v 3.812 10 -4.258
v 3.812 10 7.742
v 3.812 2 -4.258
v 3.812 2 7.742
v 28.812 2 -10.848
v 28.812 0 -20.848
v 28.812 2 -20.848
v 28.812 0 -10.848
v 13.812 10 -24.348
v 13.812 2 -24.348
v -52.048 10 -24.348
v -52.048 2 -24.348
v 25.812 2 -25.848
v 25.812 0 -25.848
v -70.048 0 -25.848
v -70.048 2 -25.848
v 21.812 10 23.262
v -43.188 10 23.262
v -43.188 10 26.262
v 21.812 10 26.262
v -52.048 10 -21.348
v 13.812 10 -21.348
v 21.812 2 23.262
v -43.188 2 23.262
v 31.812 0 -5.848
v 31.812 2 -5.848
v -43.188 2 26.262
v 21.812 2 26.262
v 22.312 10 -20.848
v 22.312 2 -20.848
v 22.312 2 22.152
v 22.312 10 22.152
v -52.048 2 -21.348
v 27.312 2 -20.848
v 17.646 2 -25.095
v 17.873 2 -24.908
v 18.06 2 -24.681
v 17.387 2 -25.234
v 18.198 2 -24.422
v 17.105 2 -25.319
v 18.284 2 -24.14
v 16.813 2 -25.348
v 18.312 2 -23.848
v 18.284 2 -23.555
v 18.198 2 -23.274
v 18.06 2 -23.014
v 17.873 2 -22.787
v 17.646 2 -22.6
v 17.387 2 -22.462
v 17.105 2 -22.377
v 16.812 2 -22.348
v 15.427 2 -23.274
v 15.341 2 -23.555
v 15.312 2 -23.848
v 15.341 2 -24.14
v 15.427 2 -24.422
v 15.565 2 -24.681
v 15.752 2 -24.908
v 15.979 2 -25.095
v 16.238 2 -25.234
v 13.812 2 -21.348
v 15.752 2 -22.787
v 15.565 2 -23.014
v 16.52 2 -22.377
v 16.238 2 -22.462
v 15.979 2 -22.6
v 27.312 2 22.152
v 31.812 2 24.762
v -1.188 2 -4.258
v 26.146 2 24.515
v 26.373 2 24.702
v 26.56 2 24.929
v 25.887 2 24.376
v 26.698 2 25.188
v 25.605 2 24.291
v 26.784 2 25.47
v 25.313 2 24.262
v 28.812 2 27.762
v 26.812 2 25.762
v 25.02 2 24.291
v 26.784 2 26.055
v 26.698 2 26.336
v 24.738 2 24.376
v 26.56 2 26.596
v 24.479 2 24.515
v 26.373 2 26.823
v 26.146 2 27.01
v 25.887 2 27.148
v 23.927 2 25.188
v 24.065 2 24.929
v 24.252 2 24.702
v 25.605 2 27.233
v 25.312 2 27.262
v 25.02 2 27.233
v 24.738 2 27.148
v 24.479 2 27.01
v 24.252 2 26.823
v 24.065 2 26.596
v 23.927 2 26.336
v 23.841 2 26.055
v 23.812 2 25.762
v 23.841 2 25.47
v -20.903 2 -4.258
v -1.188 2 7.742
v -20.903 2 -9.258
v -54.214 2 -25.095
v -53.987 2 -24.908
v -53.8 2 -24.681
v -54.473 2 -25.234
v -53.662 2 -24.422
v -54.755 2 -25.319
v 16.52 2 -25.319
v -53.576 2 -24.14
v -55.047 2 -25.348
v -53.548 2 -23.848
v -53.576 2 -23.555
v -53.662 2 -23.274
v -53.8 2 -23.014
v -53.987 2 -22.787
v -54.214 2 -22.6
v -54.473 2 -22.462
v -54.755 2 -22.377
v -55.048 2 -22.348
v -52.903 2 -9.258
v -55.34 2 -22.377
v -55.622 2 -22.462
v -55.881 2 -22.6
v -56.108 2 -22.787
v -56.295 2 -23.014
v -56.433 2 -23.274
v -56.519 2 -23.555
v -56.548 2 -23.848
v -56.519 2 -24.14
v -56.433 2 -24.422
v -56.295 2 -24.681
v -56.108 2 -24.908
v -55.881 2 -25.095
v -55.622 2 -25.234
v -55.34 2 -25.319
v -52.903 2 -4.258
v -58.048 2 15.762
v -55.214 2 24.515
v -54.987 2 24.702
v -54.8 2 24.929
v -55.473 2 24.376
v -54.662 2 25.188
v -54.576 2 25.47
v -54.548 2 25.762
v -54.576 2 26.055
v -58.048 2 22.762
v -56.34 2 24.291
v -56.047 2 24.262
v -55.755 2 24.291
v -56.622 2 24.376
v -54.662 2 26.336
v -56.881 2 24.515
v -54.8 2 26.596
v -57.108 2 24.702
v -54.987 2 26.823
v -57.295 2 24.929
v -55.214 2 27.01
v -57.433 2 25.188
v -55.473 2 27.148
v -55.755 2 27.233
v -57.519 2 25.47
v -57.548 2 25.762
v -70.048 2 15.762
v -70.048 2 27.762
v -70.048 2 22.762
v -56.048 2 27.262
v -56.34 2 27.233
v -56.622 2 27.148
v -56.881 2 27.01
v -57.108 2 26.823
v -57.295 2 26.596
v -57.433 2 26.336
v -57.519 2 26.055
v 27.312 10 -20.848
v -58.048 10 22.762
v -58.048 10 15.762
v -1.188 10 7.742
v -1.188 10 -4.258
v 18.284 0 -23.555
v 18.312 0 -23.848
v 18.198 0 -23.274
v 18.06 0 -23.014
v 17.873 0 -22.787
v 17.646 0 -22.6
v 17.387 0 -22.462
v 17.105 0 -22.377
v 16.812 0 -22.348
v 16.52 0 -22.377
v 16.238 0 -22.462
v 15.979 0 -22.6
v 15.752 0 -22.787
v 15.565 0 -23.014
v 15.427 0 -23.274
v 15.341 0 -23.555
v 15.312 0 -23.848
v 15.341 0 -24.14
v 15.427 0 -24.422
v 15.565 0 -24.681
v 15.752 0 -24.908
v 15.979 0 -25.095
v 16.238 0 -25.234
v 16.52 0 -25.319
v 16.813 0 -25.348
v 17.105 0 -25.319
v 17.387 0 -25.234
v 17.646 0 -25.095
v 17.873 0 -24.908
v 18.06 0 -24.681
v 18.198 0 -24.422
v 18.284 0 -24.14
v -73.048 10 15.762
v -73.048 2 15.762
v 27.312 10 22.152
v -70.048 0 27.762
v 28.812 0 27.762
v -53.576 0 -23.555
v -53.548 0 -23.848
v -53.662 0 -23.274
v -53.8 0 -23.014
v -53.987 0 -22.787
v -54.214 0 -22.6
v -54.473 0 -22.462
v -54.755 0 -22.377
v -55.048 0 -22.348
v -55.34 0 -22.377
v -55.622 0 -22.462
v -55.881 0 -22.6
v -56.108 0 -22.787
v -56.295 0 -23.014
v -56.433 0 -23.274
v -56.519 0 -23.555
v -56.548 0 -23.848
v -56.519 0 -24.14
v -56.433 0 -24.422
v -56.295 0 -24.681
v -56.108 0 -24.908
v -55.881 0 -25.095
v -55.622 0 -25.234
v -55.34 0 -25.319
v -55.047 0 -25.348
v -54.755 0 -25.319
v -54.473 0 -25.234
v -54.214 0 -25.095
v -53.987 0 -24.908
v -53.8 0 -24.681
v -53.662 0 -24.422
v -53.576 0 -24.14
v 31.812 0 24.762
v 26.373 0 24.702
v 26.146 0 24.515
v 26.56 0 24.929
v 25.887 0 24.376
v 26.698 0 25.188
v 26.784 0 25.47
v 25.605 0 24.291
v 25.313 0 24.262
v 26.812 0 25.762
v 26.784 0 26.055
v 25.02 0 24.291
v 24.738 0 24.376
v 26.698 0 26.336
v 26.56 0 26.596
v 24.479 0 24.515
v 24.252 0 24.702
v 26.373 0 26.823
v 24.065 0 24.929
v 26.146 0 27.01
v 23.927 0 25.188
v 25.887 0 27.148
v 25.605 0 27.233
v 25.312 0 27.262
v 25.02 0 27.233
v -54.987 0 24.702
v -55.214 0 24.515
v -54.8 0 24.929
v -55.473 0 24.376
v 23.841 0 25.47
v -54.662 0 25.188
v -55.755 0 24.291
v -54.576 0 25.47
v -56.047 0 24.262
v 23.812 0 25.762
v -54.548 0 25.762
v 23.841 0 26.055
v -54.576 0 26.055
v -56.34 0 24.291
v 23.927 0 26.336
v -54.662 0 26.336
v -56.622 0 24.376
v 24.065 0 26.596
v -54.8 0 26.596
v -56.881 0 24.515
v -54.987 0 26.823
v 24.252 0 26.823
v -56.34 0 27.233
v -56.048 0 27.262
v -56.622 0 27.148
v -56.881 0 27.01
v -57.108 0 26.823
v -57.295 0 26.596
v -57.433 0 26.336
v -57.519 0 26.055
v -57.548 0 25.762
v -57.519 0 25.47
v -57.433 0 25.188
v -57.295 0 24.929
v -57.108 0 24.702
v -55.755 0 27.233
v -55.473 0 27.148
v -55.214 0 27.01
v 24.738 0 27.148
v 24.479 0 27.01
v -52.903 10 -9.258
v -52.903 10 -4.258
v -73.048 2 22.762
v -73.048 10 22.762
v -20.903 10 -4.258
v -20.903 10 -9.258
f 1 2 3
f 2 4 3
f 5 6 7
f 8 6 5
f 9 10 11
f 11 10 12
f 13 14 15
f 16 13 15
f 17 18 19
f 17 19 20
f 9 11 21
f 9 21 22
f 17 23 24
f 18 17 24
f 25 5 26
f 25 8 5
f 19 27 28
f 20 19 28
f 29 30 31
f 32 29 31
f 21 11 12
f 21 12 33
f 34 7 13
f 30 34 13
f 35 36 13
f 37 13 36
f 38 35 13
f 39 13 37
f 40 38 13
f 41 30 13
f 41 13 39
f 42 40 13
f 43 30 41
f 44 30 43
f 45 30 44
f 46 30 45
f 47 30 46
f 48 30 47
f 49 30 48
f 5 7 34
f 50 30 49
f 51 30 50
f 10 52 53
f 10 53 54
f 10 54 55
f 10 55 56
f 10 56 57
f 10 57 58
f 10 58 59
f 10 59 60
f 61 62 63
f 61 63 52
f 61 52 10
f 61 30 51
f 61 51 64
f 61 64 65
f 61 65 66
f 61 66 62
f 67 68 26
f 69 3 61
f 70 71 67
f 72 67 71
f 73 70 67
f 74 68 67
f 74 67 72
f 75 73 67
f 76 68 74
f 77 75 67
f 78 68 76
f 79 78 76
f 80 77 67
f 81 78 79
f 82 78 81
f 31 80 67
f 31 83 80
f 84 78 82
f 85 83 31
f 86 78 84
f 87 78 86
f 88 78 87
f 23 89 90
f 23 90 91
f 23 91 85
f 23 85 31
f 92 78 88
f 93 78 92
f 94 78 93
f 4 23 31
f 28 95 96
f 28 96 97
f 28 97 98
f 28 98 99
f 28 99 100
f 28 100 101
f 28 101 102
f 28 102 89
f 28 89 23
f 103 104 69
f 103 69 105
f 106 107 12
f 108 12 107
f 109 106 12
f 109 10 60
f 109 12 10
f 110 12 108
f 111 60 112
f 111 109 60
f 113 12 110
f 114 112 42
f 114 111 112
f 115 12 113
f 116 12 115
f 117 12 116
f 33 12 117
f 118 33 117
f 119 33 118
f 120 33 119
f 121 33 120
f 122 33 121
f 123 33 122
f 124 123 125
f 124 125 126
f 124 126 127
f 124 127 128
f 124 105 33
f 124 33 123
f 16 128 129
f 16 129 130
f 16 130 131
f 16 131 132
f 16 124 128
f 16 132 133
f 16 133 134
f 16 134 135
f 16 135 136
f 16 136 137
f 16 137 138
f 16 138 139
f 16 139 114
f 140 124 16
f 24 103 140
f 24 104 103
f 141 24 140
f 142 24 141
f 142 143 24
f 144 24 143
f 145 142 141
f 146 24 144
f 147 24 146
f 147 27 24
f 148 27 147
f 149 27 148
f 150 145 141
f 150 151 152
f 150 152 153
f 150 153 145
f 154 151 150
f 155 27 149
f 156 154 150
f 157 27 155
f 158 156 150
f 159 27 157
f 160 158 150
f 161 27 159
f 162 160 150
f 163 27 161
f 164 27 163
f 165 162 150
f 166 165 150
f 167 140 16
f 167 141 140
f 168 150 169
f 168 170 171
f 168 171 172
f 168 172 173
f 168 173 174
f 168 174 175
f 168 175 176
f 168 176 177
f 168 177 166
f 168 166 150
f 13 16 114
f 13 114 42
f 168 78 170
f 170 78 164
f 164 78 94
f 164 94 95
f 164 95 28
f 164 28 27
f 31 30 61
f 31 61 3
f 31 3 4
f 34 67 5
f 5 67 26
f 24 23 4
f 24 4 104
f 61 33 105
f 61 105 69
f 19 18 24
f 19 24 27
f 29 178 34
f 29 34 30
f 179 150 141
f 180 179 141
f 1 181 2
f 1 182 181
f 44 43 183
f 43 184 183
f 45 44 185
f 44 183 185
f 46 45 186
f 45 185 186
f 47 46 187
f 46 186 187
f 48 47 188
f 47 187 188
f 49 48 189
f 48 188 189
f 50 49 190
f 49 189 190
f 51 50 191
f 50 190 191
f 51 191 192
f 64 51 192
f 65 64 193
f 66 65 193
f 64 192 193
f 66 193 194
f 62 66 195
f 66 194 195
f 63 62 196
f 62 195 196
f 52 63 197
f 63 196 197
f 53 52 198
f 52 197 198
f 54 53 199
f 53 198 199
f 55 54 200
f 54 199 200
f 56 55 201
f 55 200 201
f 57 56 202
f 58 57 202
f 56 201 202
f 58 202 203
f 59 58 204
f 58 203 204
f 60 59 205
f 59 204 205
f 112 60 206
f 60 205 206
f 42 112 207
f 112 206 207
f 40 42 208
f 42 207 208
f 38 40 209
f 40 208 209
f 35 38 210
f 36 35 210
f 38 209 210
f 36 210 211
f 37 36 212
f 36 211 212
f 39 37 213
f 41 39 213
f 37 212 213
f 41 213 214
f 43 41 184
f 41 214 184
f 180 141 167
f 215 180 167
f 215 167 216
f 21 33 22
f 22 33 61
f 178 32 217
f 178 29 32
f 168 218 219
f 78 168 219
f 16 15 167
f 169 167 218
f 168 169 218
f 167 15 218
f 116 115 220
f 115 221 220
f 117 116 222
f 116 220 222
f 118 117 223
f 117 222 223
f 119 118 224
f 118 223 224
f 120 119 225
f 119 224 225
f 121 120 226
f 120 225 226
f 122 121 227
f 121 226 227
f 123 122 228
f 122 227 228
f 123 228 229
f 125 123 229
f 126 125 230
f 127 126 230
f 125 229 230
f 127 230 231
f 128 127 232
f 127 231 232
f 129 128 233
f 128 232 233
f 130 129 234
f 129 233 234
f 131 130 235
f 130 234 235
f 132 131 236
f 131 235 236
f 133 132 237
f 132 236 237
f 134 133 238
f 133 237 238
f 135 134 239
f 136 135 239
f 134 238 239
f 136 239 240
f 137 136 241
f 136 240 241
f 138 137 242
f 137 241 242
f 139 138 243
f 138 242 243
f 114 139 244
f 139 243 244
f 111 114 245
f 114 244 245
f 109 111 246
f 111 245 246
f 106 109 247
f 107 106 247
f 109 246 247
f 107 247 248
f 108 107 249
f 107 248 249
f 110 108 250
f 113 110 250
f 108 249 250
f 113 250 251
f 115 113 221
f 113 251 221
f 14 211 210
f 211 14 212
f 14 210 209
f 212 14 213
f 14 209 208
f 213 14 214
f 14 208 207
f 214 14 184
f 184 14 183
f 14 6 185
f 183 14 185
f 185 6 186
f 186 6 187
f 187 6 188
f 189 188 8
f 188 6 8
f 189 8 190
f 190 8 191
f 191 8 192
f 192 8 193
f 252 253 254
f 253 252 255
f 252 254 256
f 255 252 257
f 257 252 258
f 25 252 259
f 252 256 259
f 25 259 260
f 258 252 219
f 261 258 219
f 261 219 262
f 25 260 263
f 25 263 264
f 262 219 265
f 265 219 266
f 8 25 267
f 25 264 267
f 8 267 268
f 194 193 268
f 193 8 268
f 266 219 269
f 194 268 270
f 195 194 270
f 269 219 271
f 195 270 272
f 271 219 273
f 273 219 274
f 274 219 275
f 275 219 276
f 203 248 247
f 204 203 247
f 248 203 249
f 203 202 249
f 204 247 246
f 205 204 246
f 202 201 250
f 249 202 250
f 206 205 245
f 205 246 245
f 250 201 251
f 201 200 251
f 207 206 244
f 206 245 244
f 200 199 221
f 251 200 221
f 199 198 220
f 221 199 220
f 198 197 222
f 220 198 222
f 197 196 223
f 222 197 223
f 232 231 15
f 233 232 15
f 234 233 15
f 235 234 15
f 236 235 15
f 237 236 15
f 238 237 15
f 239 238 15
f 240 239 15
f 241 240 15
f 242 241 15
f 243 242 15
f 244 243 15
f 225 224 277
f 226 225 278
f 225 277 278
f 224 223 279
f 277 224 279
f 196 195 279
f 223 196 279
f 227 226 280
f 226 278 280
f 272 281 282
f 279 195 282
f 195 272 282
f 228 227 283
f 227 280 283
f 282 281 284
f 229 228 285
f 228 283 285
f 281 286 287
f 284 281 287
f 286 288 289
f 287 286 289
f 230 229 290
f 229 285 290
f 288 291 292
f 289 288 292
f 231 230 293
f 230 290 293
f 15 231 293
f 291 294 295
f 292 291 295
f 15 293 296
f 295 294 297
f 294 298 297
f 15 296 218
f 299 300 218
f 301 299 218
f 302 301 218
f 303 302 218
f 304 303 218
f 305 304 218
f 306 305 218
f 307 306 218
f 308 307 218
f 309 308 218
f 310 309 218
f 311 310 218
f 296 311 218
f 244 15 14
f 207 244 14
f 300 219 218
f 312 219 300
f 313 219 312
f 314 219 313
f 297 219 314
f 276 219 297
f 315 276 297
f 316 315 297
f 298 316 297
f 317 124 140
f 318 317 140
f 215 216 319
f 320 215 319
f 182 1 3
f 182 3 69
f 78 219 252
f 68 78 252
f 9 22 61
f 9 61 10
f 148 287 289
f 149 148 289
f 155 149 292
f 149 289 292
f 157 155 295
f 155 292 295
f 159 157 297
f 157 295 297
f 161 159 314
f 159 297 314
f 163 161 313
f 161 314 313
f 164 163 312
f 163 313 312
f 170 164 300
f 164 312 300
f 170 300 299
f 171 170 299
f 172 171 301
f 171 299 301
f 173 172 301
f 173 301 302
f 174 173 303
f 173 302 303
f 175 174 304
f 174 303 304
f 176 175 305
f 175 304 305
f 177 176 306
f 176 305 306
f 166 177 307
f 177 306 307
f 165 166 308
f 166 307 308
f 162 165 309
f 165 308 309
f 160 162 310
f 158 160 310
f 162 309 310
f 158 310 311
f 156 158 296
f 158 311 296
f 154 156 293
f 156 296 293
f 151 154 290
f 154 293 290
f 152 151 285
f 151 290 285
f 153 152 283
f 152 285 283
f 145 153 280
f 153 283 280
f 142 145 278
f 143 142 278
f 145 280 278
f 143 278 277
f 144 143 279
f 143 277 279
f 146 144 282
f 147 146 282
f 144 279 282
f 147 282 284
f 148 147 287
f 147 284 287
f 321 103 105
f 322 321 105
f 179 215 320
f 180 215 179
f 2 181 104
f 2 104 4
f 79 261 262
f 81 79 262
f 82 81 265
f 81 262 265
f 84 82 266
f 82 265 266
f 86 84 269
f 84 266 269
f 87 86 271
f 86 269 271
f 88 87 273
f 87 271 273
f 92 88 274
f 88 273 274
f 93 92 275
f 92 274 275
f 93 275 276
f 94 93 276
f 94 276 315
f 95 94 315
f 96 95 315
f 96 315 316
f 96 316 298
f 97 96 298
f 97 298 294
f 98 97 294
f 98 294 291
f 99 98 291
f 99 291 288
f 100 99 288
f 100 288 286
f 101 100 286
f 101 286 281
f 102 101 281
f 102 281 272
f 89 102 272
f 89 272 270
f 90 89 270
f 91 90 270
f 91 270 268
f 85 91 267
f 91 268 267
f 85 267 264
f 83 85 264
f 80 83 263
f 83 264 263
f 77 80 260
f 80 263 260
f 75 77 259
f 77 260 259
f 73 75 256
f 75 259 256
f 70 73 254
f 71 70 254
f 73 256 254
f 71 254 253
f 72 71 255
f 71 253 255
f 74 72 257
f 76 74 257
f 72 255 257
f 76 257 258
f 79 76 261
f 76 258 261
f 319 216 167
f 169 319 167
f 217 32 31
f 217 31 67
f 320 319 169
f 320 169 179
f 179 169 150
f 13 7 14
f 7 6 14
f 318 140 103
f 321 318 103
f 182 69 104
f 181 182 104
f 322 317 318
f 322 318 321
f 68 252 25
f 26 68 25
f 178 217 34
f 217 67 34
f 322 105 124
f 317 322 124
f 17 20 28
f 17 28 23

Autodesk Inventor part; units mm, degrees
ref_plane "YZ Plane" through (0, 0, 0) normal (1, 0, 0) x (0, 1, 0)
ref_plane "XZ Plane" through (0, 0, 0) normal (0, 1, 0) x (-1, 0, 0)
ref_plane "XY Plane" through (0, 0, 0) normal (0, 0, 1) x (1, 0, 0)
sketch "Boceto1" plane through (0, 0, 0) normal (0, 1, 0) x (-1, 0, 0)
  line L0 (70.0475, 27.7623) -> (-31.8125, 27.7623)
  line L1 (-31.8125, 27.7623) -> (-31.8125, -25.8477)
  line L2 (-31.8125, -25.8477) -> (70.0475, -25.8477)
  line L3 (70.0475, -25.8477) -> (70.0475, 27.7623)
  point P0 (0, 0)
  dimension "d0" = 53.61
  dimension "d1" = 101.86
extrude "Extrusión1" add sketch "Boceto1" along normal blind 2
sketch "Boceto6" plane through (0, 0, 0) normal (0, -1, 0) x (1, 0, 0)
  line L0 (-50.0475, 27.7623) -> (23.8125, 27.7623) projected
  line L1 (28.8125, 27.7623) -> (31.8125, 24.7623)
  line L2 (31.8125, 27.7623) -> (31.8125, -25.8477) projected
  line L3 (-70.0475, 27.7623) -> (31.8125, 27.7623) projected
  line L4 (28.8125, 27.7623) -> (31.8125, 27.7623)
  line L5 (31.8125, 27.7623) -> (31.8125, 24.7623)
  circle A0 centre (25.3125, 25.7623) radius 1.5
  line L6 (31.8125, 17.7623) -> (31.8125, -25.8477) projected
  line L7 (31.8125, -15.8477) -> (25.8125, -25.8477)
  line L8 (31.8125, -25.8477) -> (23.8125, -25.8477) projected
  line L9 (31.8125, -25.8477) -> (28.8125, -25.8477)
  line L10 (28.8125, -25.8477) -> (28.8125, 5.0493)
  line L11 (28.8125, -10.8477) -> (31.8125, -5.8477)
  line L12 (31.8125, -5.8477) -> (31.8125, -25.8477)
  line L13 (25.8125, -25.8477) -> (31.8125, -25.8477)
  circle A1 centre (16.8125, -23.8477) radius 1.5
  line L14 (31.8125, -25.8477) -> (-70.0475, -25.8477) projected
  circle A2 centre (-56.0475, 25.7623) radius 1.5
  line L15 (-70.0475, 27.7623) -> (31.8125, 27.7623) projected
  line L16 (-70.0475, -25.8477) -> (-70.0475, 27.7623) projected
  circle A3 centre (-55.0475, -23.8477) radius 1.5
  point P0 (0, 0)
  point P1 (28.8125, -20.8477)
  point P2 (28.8125, -20.8477)
  dimension "d39" = 3
  dimension "d40" = 3
  dimension "d41" = 3
  dimension "d42" = 6.5
  dimension "d43" = 2
  dimension "d44" = 6
  dimension "d45" = 10
  dimension "d46" = 3
  dimension "d47" = 10
  dimension "d48" = 10
  dimension "d49" = 3
  dimension "d50" = 2
  dimension "d51" = 15
  dimension "d52" = 3
  dimension "d53" = 2
  dimension "d54" = 14
  dimension "d55" = 3
  dimension "d56" = 2
  dimension "d57" = 15
extrude "Extrusión7" cut sketch "Boceto6" against normal blind 3 contours L3 L2 L1 | L7 L10 L8 | L2 L7 L10 L11 | L7 L2 L8 L10 | A0 | A1 | A2 | A3
sketch "Boceto5" plane through (0, 2, 0) normal (0, 1, 0) x (1, 0, 0)
  line L0 (-73.0475, -22.7623) -> (-58.0475, -22.7623)
  line L1 (-58.0475, -22.7623) -> (-58.0475, -15.7623)
  line L2 (-58.0475, -15.7623) -> (-73.0475, -15.7623)
  line L3 (-73.0475, -15.7623) -> (-73.0475, -22.7623)
  line L4 (-70.0475, -27.7623) -> (31.8125, -27.7623) projected
  line L5 (-70.0475, 25.8477) -> (-70.0475, -27.7623) projected
  point P0 (0, 0)
  point P1 (-50.0475, -27.7623)
  point P2 (-65.5475, -22.7623)
  dimension "d33" = 5
  dimension "d34" = 7
  dimension "d35" = 3
  dimension "d36" = 15
extrude "Extrusión6" add sketch "Boceto5" along normal blind 8
sketch "Boceto4" plane through (0, 2, 0) normal (0, 1, 0) x (1, 0, 0)
  line L0 (-52.9032, 4.2581) -> (-20.9032, 4.2581)
  line L1 (-20.9032, 4.2581) -> (-20.9032, 9.2581)
  line L2 (-20.9032, 9.2581) -> (-52.9032, 9.2581)
  line L3 (-52.9032, 9.2581) -> (-52.9032, 4.2581)
  line L4 (-1.1875, -7.7419) -> (3.8125, -7.7419)
  line L5 (3.8125, -7.7419) -> (3.8125, 4.2581)
  line L6 (3.8125, 4.2581) -> (-1.1875, 4.2581)
  line L7 (-1.1875, 4.2581) -> (-1.1875, -7.7419)
  line L8 (23.8125, 25.8477) -> (23.8125, -17.7623) projected
  point P0 (0, 0)
  point P1 (-36.9032, 9.2581)
  point P2 (-36.9032, 4.2581)
  point P3 (1.3125, 4.2581)
  point P4 (1.3125, -7.7419)
  point P5 (-1.1875, -1.7419)
  point P6 (3.8125, -1.7419)
  point P7 (-20.9032, 6.7581)
  point P8 (-52.9032, 6.7581)
  dimension "d19" = 5
  dimension "d20" = 12
  dimension "d21" = 5
  dimension "d22" = 32
  dimension "d23" = 20
extrude "Extrusión4" add sketch "Boceto4" along normal blind 8
sketch "Boceto7" plane through (0, 2, 0) normal (0, 1, 0) x (1, 0, 0)
  line L0 (27.3125, 20.8477) -> (22.3125, 20.8477)
  line L1 (22.3125, 20.8477) -> (22.3125, -22.1523)
  line L2 (22.3125, -22.1523) -> (27.3125, -22.1523)
  line L3 (27.3125, -22.1523) -> (27.3125, 20.8477)
  line L4 (28.8125, 10.8477) -> (28.8125, 20.8477) projected
  line L5 (25.8125, 25.8477) -> (-70.0475, 25.8477) projected
  line L6 (21.8125, -23.2623) -> (-43.1875, -23.2623)
  line L7 (-43.1875, -23.2623) -> (-43.1875, -26.2623)
  line L8 (-43.1875, -26.2623) -> (21.8125, -26.2623)
  line L9 (21.8125, -26.2623) -> (21.8125, -23.2623)
  line L10 (-70.0475, -27.7623) -> (28.8125, -27.7623) projected
  line L11 (31.8125, -24.7623) -> (31.8125, 5.8477) projected
  line L12 (13.8125, 24.3477) -> (-52.0475, 24.3477)
  line L13 (-52.0475, 24.3477) -> (-52.0475, 21.3477)
  line L14 (-52.0475, 21.3477) -> (13.8125, 21.3477)
  line L15 (13.8125, 21.3477) -> (13.8125, 24.3477)
  line L16 (-70.0475, 25.8477) -> (-70.0475, -15.7623) projected
  point P0 (0, 0)
  point P1 (24.8125, 20.8477)
  point P2 (21.8125, -24.7623)
  point P3 (-43.1875, -24.7623)
  point P4 (13.8125, 22.8477)
  point P5 (-52.0475, 22.8477)
  dimension "d60" = 1.5
  dimension "d61" = 5
  dimension "d62" = 5
  dimension "d63" = 43
  dimension "d64" = 1.5
  dimension "d65" = 3
  dimension "d66" = 10
  dimension "d67" = 65
  dimension "d68" = 1.5
  dimension "d69" = 3
  dimension "d70" = 15
  dimension "d71" = 18
extrude "Extrusión8" add sketch "Boceto7" along normal blind 8
properties part number "Wemos Mega"
